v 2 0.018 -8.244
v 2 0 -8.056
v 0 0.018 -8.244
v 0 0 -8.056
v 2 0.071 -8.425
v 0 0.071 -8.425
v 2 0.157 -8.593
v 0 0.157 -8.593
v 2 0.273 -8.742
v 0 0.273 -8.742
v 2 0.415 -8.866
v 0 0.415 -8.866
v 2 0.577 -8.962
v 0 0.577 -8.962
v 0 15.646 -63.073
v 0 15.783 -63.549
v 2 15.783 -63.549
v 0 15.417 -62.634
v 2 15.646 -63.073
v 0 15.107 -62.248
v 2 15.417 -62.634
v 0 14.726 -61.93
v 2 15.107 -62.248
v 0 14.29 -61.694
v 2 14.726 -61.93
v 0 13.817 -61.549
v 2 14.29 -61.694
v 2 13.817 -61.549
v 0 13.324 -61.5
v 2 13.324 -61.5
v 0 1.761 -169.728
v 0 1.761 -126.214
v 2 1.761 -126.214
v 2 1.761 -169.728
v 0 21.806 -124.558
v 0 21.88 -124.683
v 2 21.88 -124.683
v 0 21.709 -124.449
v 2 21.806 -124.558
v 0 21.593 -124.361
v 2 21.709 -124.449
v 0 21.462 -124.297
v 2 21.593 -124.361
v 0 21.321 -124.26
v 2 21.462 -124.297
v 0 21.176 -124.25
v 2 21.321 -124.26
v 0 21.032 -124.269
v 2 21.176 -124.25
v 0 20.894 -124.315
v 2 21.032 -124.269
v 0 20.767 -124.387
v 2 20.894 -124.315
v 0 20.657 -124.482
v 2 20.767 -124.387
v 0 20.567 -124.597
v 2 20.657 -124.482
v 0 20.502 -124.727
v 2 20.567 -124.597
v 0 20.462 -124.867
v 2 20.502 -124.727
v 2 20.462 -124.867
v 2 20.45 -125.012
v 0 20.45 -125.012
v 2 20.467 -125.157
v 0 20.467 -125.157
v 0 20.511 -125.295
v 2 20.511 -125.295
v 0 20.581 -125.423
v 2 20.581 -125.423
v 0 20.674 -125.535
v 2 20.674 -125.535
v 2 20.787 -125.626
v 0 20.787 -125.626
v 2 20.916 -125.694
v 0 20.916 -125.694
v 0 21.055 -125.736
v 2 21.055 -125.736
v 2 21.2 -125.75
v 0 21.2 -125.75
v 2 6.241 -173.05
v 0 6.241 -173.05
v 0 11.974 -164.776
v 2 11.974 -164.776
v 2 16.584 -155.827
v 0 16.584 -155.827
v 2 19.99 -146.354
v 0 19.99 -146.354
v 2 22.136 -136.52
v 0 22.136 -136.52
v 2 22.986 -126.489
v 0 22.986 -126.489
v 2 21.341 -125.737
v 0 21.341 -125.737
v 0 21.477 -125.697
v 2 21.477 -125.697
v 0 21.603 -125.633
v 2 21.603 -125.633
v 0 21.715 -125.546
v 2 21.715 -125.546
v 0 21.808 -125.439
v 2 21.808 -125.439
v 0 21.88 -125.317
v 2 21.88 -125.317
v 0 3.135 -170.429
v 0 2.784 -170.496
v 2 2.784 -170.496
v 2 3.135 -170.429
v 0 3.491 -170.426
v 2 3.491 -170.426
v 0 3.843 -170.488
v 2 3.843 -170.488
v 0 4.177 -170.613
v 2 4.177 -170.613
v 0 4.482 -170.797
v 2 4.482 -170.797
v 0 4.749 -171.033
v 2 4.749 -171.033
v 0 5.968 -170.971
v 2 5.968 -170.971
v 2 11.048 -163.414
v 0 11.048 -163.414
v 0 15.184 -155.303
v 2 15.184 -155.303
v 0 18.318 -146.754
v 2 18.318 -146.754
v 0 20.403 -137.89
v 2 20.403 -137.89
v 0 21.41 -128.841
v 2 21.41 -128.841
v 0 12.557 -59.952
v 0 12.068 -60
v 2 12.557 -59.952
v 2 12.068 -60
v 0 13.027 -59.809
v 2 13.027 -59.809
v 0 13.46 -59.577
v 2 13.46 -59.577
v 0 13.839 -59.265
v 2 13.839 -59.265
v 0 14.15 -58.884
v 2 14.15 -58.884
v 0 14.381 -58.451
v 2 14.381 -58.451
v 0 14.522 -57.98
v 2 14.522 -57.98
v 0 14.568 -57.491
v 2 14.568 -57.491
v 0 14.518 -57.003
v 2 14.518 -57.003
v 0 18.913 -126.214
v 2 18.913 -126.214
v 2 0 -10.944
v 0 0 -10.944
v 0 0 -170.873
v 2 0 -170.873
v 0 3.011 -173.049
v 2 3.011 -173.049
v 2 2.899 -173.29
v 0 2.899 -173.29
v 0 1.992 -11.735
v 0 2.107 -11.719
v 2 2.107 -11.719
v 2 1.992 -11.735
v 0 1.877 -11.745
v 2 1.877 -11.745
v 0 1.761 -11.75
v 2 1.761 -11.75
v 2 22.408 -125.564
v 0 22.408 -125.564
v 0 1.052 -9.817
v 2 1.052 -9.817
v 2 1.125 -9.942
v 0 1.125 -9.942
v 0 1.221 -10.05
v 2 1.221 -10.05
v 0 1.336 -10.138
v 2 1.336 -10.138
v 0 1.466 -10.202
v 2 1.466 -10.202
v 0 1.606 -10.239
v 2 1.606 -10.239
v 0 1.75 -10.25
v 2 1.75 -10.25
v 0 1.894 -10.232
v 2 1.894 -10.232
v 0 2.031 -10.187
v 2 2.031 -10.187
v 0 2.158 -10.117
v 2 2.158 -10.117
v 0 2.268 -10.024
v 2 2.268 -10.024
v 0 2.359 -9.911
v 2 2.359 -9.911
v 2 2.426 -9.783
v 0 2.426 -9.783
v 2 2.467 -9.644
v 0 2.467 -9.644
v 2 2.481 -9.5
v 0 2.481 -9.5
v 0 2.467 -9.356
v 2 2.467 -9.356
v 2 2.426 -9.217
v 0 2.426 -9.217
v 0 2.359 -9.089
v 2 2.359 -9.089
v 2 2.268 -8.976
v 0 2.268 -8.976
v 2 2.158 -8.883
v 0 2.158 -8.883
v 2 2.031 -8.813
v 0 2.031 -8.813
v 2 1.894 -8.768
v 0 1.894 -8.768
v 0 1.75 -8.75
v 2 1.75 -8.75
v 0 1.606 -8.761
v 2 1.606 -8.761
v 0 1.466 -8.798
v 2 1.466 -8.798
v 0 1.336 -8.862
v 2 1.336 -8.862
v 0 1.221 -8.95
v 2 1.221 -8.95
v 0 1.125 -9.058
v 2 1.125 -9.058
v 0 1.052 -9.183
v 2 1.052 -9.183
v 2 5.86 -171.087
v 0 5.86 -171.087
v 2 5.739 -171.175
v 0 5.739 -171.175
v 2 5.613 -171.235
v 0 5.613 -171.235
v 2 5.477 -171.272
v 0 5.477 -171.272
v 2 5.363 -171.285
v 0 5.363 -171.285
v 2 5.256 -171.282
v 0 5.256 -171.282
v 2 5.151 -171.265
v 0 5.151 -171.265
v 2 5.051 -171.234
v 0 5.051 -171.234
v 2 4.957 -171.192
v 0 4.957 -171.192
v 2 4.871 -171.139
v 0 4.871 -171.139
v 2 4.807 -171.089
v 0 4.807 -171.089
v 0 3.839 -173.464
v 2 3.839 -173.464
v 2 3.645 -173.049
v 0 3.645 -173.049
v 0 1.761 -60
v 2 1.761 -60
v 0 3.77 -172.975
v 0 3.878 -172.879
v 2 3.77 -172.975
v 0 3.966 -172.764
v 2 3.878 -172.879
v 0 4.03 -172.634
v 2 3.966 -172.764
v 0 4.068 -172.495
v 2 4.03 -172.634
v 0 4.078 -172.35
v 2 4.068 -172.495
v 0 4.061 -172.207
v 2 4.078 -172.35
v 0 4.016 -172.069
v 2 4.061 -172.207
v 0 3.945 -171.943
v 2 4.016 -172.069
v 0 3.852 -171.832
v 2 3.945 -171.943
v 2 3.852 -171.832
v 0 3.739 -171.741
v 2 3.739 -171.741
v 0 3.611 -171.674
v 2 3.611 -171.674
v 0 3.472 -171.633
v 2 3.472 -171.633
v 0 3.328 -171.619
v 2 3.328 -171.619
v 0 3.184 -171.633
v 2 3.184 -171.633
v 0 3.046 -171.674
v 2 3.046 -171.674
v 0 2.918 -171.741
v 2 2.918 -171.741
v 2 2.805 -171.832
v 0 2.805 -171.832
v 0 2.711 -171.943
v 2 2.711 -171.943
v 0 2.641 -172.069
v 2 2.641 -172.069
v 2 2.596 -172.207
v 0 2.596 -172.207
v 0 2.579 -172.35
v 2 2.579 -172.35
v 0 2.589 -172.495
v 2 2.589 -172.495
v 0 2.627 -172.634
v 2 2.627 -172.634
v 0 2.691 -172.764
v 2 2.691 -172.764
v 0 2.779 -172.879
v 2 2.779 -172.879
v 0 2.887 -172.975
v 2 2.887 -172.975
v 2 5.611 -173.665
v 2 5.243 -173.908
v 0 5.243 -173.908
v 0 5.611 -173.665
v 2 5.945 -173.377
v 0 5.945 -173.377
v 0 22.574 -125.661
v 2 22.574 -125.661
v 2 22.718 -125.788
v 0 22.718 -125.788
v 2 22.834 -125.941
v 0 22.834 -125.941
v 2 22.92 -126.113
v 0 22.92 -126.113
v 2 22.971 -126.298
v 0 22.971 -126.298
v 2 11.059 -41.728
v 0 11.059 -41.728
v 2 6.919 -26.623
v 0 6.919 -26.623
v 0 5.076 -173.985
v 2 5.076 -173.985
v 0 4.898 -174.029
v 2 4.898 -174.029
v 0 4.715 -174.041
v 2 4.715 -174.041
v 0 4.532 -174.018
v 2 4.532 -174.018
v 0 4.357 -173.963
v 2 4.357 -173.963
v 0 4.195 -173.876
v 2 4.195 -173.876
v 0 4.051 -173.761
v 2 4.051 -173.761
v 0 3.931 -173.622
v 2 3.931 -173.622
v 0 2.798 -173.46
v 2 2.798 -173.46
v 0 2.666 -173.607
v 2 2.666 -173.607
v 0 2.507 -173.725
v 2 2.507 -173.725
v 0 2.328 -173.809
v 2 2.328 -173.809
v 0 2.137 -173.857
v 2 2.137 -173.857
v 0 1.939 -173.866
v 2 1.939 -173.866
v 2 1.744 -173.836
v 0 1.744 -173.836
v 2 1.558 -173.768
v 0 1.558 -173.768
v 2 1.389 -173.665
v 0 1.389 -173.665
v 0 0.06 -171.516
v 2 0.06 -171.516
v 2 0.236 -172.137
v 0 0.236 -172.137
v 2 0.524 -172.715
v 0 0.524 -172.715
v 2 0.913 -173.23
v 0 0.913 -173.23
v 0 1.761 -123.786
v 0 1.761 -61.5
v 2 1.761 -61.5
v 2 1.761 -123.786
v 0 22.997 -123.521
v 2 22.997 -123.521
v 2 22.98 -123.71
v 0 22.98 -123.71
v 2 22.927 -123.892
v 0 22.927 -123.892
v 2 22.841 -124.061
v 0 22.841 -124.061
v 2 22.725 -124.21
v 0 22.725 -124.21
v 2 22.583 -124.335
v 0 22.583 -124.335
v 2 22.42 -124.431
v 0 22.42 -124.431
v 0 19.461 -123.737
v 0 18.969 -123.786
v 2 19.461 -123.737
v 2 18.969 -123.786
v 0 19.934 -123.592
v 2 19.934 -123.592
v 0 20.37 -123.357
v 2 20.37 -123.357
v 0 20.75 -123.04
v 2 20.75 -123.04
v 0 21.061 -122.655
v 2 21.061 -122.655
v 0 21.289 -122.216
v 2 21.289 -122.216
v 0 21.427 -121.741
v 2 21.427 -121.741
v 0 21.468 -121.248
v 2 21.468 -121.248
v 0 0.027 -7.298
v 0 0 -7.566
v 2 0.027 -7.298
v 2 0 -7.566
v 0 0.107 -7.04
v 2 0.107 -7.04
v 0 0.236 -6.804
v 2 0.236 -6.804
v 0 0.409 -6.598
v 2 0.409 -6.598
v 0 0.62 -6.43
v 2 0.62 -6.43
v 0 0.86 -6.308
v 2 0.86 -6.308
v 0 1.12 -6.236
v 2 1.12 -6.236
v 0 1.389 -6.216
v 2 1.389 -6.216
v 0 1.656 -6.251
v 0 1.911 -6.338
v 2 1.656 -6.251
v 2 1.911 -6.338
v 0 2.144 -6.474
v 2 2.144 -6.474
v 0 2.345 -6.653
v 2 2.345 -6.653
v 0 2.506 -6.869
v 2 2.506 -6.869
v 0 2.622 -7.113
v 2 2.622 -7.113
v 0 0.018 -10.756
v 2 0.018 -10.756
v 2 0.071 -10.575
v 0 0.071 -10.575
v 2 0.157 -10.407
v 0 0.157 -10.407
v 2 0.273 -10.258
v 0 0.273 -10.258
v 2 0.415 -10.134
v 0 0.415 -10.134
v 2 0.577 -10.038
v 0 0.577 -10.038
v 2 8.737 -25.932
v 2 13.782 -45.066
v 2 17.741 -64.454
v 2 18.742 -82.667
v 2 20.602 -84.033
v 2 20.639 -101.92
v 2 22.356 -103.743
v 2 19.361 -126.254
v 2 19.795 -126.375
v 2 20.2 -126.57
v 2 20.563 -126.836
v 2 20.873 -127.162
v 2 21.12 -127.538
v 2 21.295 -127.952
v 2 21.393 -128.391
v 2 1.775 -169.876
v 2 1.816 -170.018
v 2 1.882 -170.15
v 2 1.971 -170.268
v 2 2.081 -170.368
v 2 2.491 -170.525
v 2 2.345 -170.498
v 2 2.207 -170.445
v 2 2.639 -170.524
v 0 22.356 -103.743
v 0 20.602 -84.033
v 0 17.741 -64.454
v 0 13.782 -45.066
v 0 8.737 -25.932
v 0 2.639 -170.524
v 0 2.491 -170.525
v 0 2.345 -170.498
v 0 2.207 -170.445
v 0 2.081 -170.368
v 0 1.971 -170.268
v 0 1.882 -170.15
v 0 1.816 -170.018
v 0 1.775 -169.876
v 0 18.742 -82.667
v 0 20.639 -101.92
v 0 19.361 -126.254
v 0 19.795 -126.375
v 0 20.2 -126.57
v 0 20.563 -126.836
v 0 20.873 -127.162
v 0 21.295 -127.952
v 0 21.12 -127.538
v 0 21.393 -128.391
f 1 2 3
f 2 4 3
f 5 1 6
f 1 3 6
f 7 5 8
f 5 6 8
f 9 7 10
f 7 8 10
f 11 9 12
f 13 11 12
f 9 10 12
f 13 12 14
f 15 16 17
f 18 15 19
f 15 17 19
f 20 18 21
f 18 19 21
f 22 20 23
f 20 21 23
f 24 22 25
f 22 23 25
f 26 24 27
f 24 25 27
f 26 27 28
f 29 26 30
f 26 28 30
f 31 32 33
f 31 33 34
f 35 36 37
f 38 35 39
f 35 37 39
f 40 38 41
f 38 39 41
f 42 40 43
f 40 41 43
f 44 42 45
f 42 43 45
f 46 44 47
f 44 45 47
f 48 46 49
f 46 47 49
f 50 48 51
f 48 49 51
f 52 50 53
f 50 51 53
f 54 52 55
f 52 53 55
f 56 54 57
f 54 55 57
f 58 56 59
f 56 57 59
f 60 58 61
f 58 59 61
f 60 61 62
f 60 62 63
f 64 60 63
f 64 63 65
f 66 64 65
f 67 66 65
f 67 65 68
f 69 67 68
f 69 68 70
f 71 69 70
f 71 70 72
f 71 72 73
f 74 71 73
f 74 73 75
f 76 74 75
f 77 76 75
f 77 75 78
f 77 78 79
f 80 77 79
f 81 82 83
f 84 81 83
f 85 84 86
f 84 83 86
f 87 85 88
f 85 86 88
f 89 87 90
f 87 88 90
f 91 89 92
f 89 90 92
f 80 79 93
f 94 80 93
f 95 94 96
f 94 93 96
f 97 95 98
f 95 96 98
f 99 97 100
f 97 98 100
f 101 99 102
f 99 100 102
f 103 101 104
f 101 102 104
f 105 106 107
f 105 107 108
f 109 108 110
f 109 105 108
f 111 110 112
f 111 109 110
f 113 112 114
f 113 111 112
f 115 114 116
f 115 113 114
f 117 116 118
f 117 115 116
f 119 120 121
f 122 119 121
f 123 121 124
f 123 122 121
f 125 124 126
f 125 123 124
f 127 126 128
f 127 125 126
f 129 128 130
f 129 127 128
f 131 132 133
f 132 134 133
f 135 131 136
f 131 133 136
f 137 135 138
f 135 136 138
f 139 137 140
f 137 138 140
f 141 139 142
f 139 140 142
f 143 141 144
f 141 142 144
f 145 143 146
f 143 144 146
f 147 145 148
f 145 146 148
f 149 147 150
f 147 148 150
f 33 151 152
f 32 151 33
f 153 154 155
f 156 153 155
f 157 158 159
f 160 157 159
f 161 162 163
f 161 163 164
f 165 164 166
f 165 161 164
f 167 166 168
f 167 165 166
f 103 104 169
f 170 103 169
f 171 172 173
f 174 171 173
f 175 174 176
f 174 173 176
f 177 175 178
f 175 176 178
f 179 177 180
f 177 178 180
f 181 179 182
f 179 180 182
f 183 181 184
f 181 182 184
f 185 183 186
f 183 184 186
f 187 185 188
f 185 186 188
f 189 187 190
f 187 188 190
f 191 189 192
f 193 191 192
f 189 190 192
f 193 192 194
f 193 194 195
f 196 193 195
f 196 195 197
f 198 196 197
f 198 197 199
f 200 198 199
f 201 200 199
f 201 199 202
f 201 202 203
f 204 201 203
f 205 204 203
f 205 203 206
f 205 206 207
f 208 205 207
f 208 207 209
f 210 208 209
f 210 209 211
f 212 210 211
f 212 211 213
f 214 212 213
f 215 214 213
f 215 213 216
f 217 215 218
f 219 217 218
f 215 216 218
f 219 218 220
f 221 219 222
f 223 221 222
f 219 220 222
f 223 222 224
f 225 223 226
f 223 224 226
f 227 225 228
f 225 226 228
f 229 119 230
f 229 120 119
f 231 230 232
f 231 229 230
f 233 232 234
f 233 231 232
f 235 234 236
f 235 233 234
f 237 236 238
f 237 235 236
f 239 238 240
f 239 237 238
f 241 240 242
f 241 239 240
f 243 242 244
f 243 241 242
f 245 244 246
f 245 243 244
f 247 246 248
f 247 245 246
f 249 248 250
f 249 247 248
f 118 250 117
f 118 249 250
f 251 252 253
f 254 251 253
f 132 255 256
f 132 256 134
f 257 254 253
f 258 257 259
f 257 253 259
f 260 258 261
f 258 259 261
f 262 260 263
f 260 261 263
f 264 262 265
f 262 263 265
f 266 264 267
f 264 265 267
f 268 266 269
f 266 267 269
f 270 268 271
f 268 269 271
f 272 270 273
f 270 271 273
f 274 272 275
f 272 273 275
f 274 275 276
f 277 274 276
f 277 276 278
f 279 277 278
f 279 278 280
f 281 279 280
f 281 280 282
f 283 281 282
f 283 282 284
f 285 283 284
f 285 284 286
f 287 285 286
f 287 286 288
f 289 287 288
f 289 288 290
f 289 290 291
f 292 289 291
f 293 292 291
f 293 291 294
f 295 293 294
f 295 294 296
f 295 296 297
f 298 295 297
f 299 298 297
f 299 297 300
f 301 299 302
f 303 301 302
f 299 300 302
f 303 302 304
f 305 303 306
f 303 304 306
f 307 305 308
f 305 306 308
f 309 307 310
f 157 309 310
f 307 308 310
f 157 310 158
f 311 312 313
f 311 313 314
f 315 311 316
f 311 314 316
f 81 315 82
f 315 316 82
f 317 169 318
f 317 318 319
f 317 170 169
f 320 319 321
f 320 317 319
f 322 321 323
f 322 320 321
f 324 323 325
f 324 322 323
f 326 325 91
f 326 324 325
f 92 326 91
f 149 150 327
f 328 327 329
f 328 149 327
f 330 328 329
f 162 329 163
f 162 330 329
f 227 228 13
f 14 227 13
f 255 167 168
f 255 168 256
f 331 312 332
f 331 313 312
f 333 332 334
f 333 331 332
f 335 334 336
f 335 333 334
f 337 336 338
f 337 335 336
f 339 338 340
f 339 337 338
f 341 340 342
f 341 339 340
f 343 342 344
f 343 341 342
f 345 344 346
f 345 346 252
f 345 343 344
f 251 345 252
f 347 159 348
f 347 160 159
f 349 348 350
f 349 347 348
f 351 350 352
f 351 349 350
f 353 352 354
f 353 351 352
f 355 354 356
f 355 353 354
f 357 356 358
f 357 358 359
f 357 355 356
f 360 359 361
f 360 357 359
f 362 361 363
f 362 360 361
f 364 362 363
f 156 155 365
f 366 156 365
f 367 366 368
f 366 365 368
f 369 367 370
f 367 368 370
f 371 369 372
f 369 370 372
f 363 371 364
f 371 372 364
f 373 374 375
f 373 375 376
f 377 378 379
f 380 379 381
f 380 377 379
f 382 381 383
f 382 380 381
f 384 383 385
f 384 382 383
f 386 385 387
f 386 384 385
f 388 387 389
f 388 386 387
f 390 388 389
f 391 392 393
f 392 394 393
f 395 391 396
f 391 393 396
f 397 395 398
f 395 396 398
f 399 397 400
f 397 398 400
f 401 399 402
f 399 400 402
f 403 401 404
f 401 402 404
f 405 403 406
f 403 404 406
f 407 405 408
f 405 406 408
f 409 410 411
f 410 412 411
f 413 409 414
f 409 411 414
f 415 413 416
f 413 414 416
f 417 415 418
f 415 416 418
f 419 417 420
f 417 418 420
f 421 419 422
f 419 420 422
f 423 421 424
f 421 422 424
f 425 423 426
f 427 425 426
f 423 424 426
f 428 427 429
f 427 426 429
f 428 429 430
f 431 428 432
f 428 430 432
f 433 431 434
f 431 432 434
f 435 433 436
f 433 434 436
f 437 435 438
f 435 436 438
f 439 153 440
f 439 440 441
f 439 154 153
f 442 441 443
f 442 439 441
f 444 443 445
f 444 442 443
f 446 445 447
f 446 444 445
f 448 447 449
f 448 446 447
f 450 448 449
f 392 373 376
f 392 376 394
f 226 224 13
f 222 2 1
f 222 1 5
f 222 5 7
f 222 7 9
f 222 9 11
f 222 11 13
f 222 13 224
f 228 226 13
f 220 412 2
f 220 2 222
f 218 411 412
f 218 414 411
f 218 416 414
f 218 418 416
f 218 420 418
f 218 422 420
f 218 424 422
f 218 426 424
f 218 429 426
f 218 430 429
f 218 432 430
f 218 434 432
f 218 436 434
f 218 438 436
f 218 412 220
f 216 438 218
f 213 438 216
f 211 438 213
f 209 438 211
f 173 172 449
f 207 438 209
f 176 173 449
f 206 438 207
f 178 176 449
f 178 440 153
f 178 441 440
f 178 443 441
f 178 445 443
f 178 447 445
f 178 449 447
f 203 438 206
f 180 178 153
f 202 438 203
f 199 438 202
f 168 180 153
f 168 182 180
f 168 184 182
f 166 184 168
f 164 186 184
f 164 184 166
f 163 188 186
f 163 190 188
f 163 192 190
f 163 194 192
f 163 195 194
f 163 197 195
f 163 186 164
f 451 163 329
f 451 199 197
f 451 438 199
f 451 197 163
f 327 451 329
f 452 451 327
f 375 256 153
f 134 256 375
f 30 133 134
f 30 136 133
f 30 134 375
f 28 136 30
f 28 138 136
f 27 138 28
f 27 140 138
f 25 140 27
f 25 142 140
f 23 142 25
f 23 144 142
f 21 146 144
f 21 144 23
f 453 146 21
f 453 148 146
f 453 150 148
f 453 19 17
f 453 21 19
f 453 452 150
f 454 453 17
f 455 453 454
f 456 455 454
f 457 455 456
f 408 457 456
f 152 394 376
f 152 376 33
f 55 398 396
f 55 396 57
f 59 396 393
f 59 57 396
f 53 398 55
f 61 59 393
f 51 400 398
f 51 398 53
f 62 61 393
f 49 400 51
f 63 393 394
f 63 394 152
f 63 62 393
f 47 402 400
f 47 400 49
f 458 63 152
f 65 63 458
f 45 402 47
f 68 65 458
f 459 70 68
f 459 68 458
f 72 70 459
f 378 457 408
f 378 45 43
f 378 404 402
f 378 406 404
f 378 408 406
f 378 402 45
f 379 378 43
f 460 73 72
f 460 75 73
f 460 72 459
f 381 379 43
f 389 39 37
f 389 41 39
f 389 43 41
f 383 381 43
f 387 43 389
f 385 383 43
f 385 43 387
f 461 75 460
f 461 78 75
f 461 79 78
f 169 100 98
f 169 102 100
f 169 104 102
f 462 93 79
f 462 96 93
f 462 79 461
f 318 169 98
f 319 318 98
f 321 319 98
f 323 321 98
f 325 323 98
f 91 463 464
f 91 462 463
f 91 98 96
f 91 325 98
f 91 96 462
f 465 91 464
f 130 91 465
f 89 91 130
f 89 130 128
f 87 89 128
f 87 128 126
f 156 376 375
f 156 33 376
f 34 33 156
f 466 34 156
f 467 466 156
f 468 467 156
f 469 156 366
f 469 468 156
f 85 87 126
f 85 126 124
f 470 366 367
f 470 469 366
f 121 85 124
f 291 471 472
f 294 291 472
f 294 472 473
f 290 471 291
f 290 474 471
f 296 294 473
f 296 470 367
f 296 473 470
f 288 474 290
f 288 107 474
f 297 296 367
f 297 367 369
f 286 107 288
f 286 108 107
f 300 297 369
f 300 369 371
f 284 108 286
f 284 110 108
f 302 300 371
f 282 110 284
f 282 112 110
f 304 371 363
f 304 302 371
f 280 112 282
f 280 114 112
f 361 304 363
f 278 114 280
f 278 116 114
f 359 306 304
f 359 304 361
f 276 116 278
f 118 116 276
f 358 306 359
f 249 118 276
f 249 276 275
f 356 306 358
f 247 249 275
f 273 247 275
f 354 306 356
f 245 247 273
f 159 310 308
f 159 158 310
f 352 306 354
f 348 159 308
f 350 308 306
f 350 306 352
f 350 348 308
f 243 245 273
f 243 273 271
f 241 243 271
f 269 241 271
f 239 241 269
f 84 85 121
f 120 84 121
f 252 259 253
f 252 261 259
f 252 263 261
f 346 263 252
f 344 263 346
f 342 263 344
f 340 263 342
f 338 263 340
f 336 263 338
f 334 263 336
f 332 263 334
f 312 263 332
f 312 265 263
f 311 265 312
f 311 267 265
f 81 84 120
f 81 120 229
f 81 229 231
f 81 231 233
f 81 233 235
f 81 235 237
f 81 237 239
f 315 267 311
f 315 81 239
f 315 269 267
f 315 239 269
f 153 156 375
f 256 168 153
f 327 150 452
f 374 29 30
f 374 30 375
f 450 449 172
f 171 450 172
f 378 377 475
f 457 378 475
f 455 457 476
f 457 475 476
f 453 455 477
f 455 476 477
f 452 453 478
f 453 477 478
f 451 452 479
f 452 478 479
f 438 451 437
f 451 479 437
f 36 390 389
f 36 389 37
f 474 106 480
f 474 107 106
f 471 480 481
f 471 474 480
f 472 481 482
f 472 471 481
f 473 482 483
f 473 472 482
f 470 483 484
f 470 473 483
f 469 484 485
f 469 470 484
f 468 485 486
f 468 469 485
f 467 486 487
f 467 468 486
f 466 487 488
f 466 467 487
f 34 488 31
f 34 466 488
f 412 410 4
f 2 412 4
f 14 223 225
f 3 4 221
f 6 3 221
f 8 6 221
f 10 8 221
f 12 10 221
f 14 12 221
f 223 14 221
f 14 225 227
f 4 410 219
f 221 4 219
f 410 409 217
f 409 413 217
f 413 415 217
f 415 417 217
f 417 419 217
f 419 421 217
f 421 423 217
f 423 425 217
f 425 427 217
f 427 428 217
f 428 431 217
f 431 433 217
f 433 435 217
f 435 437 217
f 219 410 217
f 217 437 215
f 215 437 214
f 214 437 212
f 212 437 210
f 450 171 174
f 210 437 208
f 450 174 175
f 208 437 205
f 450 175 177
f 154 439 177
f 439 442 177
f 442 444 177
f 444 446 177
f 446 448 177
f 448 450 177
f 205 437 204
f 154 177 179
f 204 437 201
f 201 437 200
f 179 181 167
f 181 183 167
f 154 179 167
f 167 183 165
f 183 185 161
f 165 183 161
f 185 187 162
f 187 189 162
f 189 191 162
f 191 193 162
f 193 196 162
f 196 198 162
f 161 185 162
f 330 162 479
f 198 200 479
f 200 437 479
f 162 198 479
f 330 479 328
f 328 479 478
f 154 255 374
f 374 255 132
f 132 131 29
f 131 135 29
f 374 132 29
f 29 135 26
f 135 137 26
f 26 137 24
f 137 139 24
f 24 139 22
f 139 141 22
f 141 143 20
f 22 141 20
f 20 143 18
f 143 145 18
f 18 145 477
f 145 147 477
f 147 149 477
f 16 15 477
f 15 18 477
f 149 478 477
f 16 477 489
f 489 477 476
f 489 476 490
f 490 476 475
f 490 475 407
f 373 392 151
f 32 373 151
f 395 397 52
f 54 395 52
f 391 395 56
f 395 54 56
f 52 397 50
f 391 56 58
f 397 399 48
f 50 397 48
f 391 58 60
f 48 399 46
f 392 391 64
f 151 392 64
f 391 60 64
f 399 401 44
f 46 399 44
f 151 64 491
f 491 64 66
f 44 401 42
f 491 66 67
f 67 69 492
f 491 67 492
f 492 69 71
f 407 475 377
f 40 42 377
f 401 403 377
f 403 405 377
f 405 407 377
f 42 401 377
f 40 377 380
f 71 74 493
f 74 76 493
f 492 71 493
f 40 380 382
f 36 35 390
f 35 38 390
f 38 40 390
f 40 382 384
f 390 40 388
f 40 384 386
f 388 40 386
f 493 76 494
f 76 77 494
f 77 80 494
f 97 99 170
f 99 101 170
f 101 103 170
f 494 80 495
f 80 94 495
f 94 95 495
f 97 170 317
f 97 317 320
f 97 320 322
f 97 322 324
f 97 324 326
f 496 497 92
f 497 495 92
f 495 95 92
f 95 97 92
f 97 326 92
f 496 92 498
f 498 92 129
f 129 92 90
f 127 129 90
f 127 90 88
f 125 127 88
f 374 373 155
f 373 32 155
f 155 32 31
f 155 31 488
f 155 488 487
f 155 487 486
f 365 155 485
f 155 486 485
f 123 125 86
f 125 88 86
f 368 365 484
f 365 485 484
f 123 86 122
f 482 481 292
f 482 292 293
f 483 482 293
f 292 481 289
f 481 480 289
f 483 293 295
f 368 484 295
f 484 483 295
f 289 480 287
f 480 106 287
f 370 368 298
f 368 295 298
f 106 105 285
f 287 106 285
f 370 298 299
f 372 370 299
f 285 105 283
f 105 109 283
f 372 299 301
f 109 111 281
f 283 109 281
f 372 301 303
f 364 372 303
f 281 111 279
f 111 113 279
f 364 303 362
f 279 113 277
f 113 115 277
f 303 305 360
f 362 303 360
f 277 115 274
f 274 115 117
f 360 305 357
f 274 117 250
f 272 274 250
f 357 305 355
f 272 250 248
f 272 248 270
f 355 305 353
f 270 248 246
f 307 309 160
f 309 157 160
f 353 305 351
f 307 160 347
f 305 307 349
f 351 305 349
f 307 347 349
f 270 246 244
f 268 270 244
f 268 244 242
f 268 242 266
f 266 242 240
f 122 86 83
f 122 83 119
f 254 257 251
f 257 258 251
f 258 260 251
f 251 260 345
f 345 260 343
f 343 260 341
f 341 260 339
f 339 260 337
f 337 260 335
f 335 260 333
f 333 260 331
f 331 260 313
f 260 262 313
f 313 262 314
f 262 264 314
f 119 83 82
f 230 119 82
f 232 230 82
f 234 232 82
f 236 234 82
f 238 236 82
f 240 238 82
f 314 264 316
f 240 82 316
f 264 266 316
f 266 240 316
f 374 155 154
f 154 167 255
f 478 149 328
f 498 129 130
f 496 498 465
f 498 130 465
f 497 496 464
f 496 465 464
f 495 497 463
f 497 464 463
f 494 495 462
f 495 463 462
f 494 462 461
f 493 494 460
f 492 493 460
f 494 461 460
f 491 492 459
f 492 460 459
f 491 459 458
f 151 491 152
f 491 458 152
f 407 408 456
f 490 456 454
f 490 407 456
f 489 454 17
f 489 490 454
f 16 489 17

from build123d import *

# Parameters (mm, degrees)
BOSS_EXTRU_1_DEPTH      = 2
CONG_2_R                = 1.35
ESQUISSE4_R             = 0.75
ENL_V_MAT_EXTRU_2_DEPTH = 176.894862906
CONG_5_R                = 1
ENL_V_MAT_EXTRU_3_DEPTH = 4
CONG_3_R                = 2.5
CONG_4_R                = 0.8


with BuildPart() as part:
    # Esquisse2 → Boss.-Extru.1 (new body)
    with BuildSketch(Plane(origin=(0, 0, 0), x_dir=(0, 0, -1), z_dir=(1, 0, 0))):
        with BuildLine():
            Line((0, 0), (170.873171093, 0))
            ThreePointArc((170.873171093, 0), (174.177922559, 2.347343181), (173.049882129, 6.240789861))
            ThreePointArc((173.049882129, 6.240789861), (150.444362328, 18.689979585), (125, 23))
            ThreePointArc((125, 23), (61.450806457, 17.202138822), (0, 0))
        make_face()
    extrude(amount=BOSS_EXTRU_1_DEPTH)

    # Congé2
    cong_2_edges = [part.edges().sort_by_distance(p)[0] for p in [
        (1, 0, 0),
    ]]
    fillet(cong_2_edges, radius=CONG_2_R)

    # Esquisse4 → Enlèv. mat.-Extru.2 (cut, through all)
    with BuildSketch(Plane(origin=(2, 0, 0), x_dir=(0, 0, -1), z_dir=(1, 0, 0))):
        with BuildLine():
            ThreePointArc((125.75, 21.2), (125.632543584, 21.602974706), (125.316963696, 21.87973084))
            Line((125.316963696, 21.87973084), (125, 21.2))
            Line((125, 21.2), (124.683036304, 21.87973084))
            ThreePointArc((124.683036304, 21.87973084), (124.597025294, 20.567456416), (125.75, 21.2))
        make_face()
        with BuildLine():
            Line((125, 21.2), (125.316963696, 21.87973084))
            ThreePointArc((125.316963696, 21.87973084), (125, 21.95), (124.683036304, 21.87973084))
            Line((124.683036304, 21.87973084), (125, 21.2))
        make_face()
        with Locations((172.368958832, 3.328337296)):
            Circle(ESQUISSE4_R)
        with Locations((9.5, 1.731368161)):
            Circle(ESQUISSE4_R)
        with BuildLine():
            Line((125.316963696, 21.87973084), (125.837238378, 22.995463495))
            ThreePointArc((125.837238378, 22.995463495), (125.418625334, 22.998865865), (125, 23))
            ThreePointArc((125, 23), (124.580556422, 22.999749507), (124.161113442, 22.99899803))
            Line((124.161113442, 22.99899803), (124.683036304, 21.87973084))
            ThreePointArc((124.683036304, 21.87973084), (125, 21.95), (125.316963696, 21.87973084))
        make_face()
        with BuildLine():
            Line((125.837238378, 22.995463495), (126.398922974, 24.2))
            Line((126.398922974, 24.2), (123.601077026, 24.2))
            Line((123.601077026, 24.2), (124.161113442, 22.99899803))
            ThreePointArc((124.161113442, 22.99899803), (124.580556422, 22.999749507), (125, 23))
            ThreePointArc((125, 23), (125.418625334, 22.998865865), (125.837238378, 22.995463495))
        make_face()
        with BuildLine():
            ThreePointArc((174.217111681, 2.466529469), (174.369594573, 3.34181388), (174.296772549, 4.227291596))
            Line((174.296772549, 4.227291596), (173.048689672, 3.645300993))
            ThreePointArc((173.048689672, 3.645300993), (173.101180837, 3.490667007), (173.118958832, 3.328337296))
            ThreePointArc((173.118958832, 3.328337296), (173.101180837, 3.166007586), (173.048689672, 3.0113736))
            Line((173.048689672, 3.0113736), (174.217111681, 2.466529469))
        make_face()
        with BuildLine():
            ThreePointArc((173.118958832, 3.328337296), (173.101180837, 3.490667007), (173.048689672, 3.645300993))
            Line((173.048689672, 3.645300993), (172.368958832, 3.328337296))
            Line((172.368958832, 3.328337296), (173.048689672, 3.0113736))
            ThreePointArc((173.048689672, 3.0113736), (173.101180837, 3.166007586), (173.118958832, 3.328337296))
        make_face()
        with BuildLine():
            Line((172.368958832, 3.328337296), (173.048689672, 3.645300993))
            ThreePointArc((173.048689672, 3.645300993), (171.618958832, 3.328337296), (173.048689672, 3.0113736))
            Line((173.048689672, 3.0113736), (172.368958832, 3.328337296))
        make_face()
        with BuildLine():
            Line((175.368958832, 4.727260271), (174.296772549, 4.227291596))
            ThreePointArc((174.296772549, 4.227291596), (174.369594573, 3.34181388), (174.217111681, 2.466529469))
            Line((174.217111681, 2.466529469), (175.368958832, 1.929414322))
            Line((175.368958832, 1.929414322), (175.368958832, 4.727260271))
        make_face()
        with BuildLine():
            ThreePointArc((9.183036304, 1.051637321), (9.5, 0.981368161), (9.816963696, 1.051637321))
            Line((9.816963696, 1.051637321), (9.5, 1.731368161))
            Line((9.5, 1.731368161), (9.183036304, 1.051637321))
        make_face()
        with BuildLine():
            Line((9.5, 1.731368161), (9.816963696, 1.051637321))
            ThreePointArc((9.816963696, 1.051637321), (10.132543584, 1.328393455), (10.25, 1.731368161))
            ThreePointArc((10.25, 1.731368161), (9.097025294, 2.363911745), (9.183036304, 1.051637321))
            Line((9.183036304, 1.051637321), (9.5, 1.731368161))
        make_face()
        with BuildLine():
            Line((8.692649767, 0), (10.307350233, 0))
            Line((10.307350233, 0), (9.816963696, 1.051637321))
            ThreePointArc((9.816963696, 1.051637321), (9.5, 0.981368161), (9.183036304, 1.051637321))
            Line((9.183036304, 1.051637321), (8.692649767, 0))
        make_face()
        Polygon((10.898922974, -1.268631839), (10.307350233, 0), (8.692649767, 0), (8.101077026, -1.268631839), align=None)
    extrude(amount=-ENL_V_MAT_EXTRU_2_DEPTH, mode=Mode.SUBTRACT)

    # Congé5
    cong_5_edges = [part.edges().sort_by_distance(p)[0] for p in [
        (1, 22.99899803, -124.161113442),
        (1, 22.995463495, -125.837238378),
        (1, 4.227291596, -174.296772549),
        (1, 2.466529469, -174.217111681),
        (1, 0, -10.307350233),
        (1, 0, -8.692649767),
    ]]
    fillet(cong_5_edges, radius=CONG_5_R)

    # Esquisse9 → Enlèv. mat.-Extru.3 (cut)
    with BuildSketch(Plane(origin=(0, 0, 0), x_dir=(0, 0, -1), z_dir=(1, 0, 0))):
        with BuildLine():
            Line((126.213985158, 1.761191042), (171.208548293, 1.761191042))
            ThreePointArc((171.208548293, 1.761191042), (170.45940521, 3.723438508), (171.92571116, 5.227292667))
            ThreePointArc((171.92571116, 5.227292667), (150.407492919, 17.120662481), (126.213985158, 21.497892659))
            Line((126.213985158, 21.497892659), (126.213985158, 1.761191042))
        make_face()
        with BuildLine():
            Line((11.749802346, 1.761191042), (60, 1.761191042))
            Line((60, 1.761191042), (60, 15.113262564))
            ThreePointArc((60, 15.113262564), (35.626415593, 9.474190858), (11.71850292, 2.106527851))
            ThreePointArc((11.71850292, 2.106527851), (11.740815112, 1.934463297), (11.749802346, 1.761191042))
        make_face()
        with BuildLine():
            Line((61.5, 1.761191042), (123.786014842, 1.761191042))
            Line((123.786014842, 1.761191042), (123.786014842, 21.497892659))
            ThreePointArc((123.786014842, 21.497892659), (92.506301163, 19.845888558), (61.5, 15.400790857))
            Line((61.5, 15.400790857), (61.5, 1.761191042))
        make_face()
    extrude(amount=ENL_V_MAT_EXTRU_3_DEPTH, mode=Mode.SUBTRACT)

    # Congé3
    cong_3_edges = [part.edges().sort_by_distance(p)[0] for p in [
        (1, 15.113262564, -60),
        (1, 21.497892659, -126.213985158),
        (1, 21.497892659, -123.786014842),
        (1, 15.400790857, -61.5),
    ]]
    fillet(cong_3_edges, radius=CONG_3_R)

    # Congé4
    cong_4_edges = [part.edges().sort_by_distance(p)[0] for p in [
        (1, 5.227292667, -171.92571116),
        (1, 1.761191042, -171.208548293),
    ]]
    fillet(cong_4_edges, radius=CONG_4_R)


solid = part.part
